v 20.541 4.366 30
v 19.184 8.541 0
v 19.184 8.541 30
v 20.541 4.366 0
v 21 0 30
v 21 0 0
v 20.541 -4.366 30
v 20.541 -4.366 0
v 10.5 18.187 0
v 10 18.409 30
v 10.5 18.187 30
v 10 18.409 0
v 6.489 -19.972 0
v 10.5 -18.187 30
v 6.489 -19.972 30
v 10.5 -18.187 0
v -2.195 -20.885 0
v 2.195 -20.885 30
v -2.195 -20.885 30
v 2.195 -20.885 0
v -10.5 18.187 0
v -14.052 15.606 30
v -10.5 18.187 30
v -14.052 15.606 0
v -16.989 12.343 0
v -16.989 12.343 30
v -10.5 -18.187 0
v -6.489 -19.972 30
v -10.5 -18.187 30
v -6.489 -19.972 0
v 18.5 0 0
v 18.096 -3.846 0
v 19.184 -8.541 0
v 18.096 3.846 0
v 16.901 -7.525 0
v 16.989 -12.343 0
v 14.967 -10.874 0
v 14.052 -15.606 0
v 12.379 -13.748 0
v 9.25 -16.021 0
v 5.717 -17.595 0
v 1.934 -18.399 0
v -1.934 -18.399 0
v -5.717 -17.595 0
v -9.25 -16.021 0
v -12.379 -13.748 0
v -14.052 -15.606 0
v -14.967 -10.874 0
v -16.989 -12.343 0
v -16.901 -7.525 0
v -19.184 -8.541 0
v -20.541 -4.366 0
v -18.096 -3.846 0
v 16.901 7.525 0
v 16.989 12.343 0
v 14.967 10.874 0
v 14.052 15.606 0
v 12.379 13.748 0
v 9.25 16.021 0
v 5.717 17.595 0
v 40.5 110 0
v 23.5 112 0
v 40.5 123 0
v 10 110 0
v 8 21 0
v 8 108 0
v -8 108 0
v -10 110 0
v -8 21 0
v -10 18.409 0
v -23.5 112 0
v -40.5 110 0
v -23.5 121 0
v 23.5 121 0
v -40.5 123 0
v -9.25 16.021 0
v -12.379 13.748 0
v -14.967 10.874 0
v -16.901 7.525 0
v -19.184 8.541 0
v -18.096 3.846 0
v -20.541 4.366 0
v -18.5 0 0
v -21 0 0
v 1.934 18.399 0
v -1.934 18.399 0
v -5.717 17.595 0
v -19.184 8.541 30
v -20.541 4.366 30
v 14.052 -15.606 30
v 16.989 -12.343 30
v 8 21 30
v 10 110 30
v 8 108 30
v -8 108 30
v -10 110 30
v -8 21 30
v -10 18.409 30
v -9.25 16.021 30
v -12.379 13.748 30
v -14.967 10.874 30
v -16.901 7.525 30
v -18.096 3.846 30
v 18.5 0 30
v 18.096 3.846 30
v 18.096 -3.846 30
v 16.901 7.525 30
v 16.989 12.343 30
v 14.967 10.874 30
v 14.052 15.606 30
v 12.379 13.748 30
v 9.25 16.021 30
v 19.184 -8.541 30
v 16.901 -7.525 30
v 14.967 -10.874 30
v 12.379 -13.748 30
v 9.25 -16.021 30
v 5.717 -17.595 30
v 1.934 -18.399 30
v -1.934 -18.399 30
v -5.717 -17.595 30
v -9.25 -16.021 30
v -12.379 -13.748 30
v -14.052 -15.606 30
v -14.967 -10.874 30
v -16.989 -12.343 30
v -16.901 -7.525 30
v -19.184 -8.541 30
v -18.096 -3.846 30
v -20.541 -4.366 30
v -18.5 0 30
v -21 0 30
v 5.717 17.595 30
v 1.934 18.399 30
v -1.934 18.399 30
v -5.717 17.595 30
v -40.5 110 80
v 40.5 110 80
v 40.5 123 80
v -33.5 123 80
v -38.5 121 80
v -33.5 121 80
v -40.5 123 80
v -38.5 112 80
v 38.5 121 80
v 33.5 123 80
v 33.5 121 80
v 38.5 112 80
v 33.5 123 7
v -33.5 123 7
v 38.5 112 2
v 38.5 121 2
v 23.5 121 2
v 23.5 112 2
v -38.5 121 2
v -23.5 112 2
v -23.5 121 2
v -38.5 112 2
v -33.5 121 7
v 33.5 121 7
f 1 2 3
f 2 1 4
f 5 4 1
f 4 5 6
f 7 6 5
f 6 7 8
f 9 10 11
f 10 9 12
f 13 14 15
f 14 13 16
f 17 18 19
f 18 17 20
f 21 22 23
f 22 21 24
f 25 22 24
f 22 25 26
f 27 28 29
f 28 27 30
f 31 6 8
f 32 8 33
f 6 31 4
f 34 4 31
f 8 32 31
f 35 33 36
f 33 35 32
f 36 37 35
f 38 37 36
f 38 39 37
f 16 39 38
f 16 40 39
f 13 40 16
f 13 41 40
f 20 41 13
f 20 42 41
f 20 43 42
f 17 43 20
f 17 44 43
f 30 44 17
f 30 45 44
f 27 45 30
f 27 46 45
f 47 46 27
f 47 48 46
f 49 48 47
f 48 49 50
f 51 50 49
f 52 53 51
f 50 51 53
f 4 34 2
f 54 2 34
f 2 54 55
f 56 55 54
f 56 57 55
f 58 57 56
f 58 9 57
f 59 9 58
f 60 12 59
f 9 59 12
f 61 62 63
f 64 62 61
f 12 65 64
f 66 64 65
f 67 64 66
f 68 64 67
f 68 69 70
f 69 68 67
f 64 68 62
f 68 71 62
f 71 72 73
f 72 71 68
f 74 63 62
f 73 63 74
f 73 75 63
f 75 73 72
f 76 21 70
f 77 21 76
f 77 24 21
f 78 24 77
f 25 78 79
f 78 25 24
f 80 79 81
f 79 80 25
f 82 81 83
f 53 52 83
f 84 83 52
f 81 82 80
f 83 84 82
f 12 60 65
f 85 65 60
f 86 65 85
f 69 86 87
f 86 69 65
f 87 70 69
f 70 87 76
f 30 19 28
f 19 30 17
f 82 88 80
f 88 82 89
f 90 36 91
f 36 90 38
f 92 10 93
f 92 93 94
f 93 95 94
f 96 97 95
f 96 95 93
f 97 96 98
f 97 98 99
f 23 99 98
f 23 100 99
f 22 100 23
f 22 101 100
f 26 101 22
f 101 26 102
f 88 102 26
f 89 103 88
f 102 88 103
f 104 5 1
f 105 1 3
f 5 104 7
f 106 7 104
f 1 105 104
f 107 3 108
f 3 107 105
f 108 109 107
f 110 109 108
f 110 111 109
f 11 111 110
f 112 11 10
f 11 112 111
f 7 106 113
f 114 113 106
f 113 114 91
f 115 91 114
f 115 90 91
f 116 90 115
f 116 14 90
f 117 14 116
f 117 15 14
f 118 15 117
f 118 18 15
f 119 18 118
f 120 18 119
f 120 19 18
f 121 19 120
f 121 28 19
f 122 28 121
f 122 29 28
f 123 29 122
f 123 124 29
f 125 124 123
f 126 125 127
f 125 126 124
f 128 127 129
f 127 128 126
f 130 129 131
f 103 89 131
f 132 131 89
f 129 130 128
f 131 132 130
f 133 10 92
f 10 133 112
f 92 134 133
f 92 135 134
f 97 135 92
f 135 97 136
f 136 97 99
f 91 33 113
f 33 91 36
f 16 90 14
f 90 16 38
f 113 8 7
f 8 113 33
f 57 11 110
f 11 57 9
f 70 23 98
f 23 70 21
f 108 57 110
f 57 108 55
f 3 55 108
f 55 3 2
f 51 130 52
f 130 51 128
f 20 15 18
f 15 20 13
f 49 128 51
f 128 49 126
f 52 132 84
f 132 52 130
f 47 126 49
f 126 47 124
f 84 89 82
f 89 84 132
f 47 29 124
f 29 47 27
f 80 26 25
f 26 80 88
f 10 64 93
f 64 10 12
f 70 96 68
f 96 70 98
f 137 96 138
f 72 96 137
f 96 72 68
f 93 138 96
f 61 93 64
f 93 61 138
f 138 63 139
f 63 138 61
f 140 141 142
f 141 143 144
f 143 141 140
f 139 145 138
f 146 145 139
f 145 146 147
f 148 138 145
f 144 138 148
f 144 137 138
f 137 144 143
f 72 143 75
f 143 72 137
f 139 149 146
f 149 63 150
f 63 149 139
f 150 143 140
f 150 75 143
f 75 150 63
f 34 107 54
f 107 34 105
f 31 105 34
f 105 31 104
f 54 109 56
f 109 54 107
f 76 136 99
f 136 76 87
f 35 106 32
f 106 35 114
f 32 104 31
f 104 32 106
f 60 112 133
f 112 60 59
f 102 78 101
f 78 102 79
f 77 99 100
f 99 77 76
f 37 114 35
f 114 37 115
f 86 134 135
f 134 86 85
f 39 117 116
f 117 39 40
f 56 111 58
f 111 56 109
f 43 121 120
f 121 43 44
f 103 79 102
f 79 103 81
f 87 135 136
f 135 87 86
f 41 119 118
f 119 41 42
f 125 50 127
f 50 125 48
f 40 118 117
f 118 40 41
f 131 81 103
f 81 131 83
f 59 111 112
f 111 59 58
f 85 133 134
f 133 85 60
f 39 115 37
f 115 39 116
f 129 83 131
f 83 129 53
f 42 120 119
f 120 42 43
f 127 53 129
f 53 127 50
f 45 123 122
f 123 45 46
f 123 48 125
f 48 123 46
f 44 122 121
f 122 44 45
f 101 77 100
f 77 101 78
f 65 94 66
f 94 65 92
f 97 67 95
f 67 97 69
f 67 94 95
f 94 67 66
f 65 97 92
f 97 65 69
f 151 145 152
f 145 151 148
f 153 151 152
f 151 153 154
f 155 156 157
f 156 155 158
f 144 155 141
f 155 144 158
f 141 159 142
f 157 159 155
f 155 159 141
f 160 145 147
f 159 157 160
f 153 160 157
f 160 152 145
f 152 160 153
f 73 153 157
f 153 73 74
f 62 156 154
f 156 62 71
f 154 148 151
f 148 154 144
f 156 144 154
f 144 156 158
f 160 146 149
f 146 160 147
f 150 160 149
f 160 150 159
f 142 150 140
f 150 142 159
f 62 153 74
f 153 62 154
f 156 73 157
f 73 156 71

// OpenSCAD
difference(){
    union(){
        cylinder(30,21,21);
        translate([-10,0,0]){
            cube([20,110,30]);
        }
        translate([-40.5,110,0]){
            cube([81,13,80]);
        }
    }
    cylinder(30,18.5,18.5);
    translate([-8,21,0]){
        cube([16,87,30]);
    }
    translate([-38.5,112,2]){
       cube([77,9,80]);
    }
    translate([-33.5,120,7]){
        cube([67,10,80]);
    }
    translate([-23.5,112,0]){
        cube([47,9,2]);
    }
}
